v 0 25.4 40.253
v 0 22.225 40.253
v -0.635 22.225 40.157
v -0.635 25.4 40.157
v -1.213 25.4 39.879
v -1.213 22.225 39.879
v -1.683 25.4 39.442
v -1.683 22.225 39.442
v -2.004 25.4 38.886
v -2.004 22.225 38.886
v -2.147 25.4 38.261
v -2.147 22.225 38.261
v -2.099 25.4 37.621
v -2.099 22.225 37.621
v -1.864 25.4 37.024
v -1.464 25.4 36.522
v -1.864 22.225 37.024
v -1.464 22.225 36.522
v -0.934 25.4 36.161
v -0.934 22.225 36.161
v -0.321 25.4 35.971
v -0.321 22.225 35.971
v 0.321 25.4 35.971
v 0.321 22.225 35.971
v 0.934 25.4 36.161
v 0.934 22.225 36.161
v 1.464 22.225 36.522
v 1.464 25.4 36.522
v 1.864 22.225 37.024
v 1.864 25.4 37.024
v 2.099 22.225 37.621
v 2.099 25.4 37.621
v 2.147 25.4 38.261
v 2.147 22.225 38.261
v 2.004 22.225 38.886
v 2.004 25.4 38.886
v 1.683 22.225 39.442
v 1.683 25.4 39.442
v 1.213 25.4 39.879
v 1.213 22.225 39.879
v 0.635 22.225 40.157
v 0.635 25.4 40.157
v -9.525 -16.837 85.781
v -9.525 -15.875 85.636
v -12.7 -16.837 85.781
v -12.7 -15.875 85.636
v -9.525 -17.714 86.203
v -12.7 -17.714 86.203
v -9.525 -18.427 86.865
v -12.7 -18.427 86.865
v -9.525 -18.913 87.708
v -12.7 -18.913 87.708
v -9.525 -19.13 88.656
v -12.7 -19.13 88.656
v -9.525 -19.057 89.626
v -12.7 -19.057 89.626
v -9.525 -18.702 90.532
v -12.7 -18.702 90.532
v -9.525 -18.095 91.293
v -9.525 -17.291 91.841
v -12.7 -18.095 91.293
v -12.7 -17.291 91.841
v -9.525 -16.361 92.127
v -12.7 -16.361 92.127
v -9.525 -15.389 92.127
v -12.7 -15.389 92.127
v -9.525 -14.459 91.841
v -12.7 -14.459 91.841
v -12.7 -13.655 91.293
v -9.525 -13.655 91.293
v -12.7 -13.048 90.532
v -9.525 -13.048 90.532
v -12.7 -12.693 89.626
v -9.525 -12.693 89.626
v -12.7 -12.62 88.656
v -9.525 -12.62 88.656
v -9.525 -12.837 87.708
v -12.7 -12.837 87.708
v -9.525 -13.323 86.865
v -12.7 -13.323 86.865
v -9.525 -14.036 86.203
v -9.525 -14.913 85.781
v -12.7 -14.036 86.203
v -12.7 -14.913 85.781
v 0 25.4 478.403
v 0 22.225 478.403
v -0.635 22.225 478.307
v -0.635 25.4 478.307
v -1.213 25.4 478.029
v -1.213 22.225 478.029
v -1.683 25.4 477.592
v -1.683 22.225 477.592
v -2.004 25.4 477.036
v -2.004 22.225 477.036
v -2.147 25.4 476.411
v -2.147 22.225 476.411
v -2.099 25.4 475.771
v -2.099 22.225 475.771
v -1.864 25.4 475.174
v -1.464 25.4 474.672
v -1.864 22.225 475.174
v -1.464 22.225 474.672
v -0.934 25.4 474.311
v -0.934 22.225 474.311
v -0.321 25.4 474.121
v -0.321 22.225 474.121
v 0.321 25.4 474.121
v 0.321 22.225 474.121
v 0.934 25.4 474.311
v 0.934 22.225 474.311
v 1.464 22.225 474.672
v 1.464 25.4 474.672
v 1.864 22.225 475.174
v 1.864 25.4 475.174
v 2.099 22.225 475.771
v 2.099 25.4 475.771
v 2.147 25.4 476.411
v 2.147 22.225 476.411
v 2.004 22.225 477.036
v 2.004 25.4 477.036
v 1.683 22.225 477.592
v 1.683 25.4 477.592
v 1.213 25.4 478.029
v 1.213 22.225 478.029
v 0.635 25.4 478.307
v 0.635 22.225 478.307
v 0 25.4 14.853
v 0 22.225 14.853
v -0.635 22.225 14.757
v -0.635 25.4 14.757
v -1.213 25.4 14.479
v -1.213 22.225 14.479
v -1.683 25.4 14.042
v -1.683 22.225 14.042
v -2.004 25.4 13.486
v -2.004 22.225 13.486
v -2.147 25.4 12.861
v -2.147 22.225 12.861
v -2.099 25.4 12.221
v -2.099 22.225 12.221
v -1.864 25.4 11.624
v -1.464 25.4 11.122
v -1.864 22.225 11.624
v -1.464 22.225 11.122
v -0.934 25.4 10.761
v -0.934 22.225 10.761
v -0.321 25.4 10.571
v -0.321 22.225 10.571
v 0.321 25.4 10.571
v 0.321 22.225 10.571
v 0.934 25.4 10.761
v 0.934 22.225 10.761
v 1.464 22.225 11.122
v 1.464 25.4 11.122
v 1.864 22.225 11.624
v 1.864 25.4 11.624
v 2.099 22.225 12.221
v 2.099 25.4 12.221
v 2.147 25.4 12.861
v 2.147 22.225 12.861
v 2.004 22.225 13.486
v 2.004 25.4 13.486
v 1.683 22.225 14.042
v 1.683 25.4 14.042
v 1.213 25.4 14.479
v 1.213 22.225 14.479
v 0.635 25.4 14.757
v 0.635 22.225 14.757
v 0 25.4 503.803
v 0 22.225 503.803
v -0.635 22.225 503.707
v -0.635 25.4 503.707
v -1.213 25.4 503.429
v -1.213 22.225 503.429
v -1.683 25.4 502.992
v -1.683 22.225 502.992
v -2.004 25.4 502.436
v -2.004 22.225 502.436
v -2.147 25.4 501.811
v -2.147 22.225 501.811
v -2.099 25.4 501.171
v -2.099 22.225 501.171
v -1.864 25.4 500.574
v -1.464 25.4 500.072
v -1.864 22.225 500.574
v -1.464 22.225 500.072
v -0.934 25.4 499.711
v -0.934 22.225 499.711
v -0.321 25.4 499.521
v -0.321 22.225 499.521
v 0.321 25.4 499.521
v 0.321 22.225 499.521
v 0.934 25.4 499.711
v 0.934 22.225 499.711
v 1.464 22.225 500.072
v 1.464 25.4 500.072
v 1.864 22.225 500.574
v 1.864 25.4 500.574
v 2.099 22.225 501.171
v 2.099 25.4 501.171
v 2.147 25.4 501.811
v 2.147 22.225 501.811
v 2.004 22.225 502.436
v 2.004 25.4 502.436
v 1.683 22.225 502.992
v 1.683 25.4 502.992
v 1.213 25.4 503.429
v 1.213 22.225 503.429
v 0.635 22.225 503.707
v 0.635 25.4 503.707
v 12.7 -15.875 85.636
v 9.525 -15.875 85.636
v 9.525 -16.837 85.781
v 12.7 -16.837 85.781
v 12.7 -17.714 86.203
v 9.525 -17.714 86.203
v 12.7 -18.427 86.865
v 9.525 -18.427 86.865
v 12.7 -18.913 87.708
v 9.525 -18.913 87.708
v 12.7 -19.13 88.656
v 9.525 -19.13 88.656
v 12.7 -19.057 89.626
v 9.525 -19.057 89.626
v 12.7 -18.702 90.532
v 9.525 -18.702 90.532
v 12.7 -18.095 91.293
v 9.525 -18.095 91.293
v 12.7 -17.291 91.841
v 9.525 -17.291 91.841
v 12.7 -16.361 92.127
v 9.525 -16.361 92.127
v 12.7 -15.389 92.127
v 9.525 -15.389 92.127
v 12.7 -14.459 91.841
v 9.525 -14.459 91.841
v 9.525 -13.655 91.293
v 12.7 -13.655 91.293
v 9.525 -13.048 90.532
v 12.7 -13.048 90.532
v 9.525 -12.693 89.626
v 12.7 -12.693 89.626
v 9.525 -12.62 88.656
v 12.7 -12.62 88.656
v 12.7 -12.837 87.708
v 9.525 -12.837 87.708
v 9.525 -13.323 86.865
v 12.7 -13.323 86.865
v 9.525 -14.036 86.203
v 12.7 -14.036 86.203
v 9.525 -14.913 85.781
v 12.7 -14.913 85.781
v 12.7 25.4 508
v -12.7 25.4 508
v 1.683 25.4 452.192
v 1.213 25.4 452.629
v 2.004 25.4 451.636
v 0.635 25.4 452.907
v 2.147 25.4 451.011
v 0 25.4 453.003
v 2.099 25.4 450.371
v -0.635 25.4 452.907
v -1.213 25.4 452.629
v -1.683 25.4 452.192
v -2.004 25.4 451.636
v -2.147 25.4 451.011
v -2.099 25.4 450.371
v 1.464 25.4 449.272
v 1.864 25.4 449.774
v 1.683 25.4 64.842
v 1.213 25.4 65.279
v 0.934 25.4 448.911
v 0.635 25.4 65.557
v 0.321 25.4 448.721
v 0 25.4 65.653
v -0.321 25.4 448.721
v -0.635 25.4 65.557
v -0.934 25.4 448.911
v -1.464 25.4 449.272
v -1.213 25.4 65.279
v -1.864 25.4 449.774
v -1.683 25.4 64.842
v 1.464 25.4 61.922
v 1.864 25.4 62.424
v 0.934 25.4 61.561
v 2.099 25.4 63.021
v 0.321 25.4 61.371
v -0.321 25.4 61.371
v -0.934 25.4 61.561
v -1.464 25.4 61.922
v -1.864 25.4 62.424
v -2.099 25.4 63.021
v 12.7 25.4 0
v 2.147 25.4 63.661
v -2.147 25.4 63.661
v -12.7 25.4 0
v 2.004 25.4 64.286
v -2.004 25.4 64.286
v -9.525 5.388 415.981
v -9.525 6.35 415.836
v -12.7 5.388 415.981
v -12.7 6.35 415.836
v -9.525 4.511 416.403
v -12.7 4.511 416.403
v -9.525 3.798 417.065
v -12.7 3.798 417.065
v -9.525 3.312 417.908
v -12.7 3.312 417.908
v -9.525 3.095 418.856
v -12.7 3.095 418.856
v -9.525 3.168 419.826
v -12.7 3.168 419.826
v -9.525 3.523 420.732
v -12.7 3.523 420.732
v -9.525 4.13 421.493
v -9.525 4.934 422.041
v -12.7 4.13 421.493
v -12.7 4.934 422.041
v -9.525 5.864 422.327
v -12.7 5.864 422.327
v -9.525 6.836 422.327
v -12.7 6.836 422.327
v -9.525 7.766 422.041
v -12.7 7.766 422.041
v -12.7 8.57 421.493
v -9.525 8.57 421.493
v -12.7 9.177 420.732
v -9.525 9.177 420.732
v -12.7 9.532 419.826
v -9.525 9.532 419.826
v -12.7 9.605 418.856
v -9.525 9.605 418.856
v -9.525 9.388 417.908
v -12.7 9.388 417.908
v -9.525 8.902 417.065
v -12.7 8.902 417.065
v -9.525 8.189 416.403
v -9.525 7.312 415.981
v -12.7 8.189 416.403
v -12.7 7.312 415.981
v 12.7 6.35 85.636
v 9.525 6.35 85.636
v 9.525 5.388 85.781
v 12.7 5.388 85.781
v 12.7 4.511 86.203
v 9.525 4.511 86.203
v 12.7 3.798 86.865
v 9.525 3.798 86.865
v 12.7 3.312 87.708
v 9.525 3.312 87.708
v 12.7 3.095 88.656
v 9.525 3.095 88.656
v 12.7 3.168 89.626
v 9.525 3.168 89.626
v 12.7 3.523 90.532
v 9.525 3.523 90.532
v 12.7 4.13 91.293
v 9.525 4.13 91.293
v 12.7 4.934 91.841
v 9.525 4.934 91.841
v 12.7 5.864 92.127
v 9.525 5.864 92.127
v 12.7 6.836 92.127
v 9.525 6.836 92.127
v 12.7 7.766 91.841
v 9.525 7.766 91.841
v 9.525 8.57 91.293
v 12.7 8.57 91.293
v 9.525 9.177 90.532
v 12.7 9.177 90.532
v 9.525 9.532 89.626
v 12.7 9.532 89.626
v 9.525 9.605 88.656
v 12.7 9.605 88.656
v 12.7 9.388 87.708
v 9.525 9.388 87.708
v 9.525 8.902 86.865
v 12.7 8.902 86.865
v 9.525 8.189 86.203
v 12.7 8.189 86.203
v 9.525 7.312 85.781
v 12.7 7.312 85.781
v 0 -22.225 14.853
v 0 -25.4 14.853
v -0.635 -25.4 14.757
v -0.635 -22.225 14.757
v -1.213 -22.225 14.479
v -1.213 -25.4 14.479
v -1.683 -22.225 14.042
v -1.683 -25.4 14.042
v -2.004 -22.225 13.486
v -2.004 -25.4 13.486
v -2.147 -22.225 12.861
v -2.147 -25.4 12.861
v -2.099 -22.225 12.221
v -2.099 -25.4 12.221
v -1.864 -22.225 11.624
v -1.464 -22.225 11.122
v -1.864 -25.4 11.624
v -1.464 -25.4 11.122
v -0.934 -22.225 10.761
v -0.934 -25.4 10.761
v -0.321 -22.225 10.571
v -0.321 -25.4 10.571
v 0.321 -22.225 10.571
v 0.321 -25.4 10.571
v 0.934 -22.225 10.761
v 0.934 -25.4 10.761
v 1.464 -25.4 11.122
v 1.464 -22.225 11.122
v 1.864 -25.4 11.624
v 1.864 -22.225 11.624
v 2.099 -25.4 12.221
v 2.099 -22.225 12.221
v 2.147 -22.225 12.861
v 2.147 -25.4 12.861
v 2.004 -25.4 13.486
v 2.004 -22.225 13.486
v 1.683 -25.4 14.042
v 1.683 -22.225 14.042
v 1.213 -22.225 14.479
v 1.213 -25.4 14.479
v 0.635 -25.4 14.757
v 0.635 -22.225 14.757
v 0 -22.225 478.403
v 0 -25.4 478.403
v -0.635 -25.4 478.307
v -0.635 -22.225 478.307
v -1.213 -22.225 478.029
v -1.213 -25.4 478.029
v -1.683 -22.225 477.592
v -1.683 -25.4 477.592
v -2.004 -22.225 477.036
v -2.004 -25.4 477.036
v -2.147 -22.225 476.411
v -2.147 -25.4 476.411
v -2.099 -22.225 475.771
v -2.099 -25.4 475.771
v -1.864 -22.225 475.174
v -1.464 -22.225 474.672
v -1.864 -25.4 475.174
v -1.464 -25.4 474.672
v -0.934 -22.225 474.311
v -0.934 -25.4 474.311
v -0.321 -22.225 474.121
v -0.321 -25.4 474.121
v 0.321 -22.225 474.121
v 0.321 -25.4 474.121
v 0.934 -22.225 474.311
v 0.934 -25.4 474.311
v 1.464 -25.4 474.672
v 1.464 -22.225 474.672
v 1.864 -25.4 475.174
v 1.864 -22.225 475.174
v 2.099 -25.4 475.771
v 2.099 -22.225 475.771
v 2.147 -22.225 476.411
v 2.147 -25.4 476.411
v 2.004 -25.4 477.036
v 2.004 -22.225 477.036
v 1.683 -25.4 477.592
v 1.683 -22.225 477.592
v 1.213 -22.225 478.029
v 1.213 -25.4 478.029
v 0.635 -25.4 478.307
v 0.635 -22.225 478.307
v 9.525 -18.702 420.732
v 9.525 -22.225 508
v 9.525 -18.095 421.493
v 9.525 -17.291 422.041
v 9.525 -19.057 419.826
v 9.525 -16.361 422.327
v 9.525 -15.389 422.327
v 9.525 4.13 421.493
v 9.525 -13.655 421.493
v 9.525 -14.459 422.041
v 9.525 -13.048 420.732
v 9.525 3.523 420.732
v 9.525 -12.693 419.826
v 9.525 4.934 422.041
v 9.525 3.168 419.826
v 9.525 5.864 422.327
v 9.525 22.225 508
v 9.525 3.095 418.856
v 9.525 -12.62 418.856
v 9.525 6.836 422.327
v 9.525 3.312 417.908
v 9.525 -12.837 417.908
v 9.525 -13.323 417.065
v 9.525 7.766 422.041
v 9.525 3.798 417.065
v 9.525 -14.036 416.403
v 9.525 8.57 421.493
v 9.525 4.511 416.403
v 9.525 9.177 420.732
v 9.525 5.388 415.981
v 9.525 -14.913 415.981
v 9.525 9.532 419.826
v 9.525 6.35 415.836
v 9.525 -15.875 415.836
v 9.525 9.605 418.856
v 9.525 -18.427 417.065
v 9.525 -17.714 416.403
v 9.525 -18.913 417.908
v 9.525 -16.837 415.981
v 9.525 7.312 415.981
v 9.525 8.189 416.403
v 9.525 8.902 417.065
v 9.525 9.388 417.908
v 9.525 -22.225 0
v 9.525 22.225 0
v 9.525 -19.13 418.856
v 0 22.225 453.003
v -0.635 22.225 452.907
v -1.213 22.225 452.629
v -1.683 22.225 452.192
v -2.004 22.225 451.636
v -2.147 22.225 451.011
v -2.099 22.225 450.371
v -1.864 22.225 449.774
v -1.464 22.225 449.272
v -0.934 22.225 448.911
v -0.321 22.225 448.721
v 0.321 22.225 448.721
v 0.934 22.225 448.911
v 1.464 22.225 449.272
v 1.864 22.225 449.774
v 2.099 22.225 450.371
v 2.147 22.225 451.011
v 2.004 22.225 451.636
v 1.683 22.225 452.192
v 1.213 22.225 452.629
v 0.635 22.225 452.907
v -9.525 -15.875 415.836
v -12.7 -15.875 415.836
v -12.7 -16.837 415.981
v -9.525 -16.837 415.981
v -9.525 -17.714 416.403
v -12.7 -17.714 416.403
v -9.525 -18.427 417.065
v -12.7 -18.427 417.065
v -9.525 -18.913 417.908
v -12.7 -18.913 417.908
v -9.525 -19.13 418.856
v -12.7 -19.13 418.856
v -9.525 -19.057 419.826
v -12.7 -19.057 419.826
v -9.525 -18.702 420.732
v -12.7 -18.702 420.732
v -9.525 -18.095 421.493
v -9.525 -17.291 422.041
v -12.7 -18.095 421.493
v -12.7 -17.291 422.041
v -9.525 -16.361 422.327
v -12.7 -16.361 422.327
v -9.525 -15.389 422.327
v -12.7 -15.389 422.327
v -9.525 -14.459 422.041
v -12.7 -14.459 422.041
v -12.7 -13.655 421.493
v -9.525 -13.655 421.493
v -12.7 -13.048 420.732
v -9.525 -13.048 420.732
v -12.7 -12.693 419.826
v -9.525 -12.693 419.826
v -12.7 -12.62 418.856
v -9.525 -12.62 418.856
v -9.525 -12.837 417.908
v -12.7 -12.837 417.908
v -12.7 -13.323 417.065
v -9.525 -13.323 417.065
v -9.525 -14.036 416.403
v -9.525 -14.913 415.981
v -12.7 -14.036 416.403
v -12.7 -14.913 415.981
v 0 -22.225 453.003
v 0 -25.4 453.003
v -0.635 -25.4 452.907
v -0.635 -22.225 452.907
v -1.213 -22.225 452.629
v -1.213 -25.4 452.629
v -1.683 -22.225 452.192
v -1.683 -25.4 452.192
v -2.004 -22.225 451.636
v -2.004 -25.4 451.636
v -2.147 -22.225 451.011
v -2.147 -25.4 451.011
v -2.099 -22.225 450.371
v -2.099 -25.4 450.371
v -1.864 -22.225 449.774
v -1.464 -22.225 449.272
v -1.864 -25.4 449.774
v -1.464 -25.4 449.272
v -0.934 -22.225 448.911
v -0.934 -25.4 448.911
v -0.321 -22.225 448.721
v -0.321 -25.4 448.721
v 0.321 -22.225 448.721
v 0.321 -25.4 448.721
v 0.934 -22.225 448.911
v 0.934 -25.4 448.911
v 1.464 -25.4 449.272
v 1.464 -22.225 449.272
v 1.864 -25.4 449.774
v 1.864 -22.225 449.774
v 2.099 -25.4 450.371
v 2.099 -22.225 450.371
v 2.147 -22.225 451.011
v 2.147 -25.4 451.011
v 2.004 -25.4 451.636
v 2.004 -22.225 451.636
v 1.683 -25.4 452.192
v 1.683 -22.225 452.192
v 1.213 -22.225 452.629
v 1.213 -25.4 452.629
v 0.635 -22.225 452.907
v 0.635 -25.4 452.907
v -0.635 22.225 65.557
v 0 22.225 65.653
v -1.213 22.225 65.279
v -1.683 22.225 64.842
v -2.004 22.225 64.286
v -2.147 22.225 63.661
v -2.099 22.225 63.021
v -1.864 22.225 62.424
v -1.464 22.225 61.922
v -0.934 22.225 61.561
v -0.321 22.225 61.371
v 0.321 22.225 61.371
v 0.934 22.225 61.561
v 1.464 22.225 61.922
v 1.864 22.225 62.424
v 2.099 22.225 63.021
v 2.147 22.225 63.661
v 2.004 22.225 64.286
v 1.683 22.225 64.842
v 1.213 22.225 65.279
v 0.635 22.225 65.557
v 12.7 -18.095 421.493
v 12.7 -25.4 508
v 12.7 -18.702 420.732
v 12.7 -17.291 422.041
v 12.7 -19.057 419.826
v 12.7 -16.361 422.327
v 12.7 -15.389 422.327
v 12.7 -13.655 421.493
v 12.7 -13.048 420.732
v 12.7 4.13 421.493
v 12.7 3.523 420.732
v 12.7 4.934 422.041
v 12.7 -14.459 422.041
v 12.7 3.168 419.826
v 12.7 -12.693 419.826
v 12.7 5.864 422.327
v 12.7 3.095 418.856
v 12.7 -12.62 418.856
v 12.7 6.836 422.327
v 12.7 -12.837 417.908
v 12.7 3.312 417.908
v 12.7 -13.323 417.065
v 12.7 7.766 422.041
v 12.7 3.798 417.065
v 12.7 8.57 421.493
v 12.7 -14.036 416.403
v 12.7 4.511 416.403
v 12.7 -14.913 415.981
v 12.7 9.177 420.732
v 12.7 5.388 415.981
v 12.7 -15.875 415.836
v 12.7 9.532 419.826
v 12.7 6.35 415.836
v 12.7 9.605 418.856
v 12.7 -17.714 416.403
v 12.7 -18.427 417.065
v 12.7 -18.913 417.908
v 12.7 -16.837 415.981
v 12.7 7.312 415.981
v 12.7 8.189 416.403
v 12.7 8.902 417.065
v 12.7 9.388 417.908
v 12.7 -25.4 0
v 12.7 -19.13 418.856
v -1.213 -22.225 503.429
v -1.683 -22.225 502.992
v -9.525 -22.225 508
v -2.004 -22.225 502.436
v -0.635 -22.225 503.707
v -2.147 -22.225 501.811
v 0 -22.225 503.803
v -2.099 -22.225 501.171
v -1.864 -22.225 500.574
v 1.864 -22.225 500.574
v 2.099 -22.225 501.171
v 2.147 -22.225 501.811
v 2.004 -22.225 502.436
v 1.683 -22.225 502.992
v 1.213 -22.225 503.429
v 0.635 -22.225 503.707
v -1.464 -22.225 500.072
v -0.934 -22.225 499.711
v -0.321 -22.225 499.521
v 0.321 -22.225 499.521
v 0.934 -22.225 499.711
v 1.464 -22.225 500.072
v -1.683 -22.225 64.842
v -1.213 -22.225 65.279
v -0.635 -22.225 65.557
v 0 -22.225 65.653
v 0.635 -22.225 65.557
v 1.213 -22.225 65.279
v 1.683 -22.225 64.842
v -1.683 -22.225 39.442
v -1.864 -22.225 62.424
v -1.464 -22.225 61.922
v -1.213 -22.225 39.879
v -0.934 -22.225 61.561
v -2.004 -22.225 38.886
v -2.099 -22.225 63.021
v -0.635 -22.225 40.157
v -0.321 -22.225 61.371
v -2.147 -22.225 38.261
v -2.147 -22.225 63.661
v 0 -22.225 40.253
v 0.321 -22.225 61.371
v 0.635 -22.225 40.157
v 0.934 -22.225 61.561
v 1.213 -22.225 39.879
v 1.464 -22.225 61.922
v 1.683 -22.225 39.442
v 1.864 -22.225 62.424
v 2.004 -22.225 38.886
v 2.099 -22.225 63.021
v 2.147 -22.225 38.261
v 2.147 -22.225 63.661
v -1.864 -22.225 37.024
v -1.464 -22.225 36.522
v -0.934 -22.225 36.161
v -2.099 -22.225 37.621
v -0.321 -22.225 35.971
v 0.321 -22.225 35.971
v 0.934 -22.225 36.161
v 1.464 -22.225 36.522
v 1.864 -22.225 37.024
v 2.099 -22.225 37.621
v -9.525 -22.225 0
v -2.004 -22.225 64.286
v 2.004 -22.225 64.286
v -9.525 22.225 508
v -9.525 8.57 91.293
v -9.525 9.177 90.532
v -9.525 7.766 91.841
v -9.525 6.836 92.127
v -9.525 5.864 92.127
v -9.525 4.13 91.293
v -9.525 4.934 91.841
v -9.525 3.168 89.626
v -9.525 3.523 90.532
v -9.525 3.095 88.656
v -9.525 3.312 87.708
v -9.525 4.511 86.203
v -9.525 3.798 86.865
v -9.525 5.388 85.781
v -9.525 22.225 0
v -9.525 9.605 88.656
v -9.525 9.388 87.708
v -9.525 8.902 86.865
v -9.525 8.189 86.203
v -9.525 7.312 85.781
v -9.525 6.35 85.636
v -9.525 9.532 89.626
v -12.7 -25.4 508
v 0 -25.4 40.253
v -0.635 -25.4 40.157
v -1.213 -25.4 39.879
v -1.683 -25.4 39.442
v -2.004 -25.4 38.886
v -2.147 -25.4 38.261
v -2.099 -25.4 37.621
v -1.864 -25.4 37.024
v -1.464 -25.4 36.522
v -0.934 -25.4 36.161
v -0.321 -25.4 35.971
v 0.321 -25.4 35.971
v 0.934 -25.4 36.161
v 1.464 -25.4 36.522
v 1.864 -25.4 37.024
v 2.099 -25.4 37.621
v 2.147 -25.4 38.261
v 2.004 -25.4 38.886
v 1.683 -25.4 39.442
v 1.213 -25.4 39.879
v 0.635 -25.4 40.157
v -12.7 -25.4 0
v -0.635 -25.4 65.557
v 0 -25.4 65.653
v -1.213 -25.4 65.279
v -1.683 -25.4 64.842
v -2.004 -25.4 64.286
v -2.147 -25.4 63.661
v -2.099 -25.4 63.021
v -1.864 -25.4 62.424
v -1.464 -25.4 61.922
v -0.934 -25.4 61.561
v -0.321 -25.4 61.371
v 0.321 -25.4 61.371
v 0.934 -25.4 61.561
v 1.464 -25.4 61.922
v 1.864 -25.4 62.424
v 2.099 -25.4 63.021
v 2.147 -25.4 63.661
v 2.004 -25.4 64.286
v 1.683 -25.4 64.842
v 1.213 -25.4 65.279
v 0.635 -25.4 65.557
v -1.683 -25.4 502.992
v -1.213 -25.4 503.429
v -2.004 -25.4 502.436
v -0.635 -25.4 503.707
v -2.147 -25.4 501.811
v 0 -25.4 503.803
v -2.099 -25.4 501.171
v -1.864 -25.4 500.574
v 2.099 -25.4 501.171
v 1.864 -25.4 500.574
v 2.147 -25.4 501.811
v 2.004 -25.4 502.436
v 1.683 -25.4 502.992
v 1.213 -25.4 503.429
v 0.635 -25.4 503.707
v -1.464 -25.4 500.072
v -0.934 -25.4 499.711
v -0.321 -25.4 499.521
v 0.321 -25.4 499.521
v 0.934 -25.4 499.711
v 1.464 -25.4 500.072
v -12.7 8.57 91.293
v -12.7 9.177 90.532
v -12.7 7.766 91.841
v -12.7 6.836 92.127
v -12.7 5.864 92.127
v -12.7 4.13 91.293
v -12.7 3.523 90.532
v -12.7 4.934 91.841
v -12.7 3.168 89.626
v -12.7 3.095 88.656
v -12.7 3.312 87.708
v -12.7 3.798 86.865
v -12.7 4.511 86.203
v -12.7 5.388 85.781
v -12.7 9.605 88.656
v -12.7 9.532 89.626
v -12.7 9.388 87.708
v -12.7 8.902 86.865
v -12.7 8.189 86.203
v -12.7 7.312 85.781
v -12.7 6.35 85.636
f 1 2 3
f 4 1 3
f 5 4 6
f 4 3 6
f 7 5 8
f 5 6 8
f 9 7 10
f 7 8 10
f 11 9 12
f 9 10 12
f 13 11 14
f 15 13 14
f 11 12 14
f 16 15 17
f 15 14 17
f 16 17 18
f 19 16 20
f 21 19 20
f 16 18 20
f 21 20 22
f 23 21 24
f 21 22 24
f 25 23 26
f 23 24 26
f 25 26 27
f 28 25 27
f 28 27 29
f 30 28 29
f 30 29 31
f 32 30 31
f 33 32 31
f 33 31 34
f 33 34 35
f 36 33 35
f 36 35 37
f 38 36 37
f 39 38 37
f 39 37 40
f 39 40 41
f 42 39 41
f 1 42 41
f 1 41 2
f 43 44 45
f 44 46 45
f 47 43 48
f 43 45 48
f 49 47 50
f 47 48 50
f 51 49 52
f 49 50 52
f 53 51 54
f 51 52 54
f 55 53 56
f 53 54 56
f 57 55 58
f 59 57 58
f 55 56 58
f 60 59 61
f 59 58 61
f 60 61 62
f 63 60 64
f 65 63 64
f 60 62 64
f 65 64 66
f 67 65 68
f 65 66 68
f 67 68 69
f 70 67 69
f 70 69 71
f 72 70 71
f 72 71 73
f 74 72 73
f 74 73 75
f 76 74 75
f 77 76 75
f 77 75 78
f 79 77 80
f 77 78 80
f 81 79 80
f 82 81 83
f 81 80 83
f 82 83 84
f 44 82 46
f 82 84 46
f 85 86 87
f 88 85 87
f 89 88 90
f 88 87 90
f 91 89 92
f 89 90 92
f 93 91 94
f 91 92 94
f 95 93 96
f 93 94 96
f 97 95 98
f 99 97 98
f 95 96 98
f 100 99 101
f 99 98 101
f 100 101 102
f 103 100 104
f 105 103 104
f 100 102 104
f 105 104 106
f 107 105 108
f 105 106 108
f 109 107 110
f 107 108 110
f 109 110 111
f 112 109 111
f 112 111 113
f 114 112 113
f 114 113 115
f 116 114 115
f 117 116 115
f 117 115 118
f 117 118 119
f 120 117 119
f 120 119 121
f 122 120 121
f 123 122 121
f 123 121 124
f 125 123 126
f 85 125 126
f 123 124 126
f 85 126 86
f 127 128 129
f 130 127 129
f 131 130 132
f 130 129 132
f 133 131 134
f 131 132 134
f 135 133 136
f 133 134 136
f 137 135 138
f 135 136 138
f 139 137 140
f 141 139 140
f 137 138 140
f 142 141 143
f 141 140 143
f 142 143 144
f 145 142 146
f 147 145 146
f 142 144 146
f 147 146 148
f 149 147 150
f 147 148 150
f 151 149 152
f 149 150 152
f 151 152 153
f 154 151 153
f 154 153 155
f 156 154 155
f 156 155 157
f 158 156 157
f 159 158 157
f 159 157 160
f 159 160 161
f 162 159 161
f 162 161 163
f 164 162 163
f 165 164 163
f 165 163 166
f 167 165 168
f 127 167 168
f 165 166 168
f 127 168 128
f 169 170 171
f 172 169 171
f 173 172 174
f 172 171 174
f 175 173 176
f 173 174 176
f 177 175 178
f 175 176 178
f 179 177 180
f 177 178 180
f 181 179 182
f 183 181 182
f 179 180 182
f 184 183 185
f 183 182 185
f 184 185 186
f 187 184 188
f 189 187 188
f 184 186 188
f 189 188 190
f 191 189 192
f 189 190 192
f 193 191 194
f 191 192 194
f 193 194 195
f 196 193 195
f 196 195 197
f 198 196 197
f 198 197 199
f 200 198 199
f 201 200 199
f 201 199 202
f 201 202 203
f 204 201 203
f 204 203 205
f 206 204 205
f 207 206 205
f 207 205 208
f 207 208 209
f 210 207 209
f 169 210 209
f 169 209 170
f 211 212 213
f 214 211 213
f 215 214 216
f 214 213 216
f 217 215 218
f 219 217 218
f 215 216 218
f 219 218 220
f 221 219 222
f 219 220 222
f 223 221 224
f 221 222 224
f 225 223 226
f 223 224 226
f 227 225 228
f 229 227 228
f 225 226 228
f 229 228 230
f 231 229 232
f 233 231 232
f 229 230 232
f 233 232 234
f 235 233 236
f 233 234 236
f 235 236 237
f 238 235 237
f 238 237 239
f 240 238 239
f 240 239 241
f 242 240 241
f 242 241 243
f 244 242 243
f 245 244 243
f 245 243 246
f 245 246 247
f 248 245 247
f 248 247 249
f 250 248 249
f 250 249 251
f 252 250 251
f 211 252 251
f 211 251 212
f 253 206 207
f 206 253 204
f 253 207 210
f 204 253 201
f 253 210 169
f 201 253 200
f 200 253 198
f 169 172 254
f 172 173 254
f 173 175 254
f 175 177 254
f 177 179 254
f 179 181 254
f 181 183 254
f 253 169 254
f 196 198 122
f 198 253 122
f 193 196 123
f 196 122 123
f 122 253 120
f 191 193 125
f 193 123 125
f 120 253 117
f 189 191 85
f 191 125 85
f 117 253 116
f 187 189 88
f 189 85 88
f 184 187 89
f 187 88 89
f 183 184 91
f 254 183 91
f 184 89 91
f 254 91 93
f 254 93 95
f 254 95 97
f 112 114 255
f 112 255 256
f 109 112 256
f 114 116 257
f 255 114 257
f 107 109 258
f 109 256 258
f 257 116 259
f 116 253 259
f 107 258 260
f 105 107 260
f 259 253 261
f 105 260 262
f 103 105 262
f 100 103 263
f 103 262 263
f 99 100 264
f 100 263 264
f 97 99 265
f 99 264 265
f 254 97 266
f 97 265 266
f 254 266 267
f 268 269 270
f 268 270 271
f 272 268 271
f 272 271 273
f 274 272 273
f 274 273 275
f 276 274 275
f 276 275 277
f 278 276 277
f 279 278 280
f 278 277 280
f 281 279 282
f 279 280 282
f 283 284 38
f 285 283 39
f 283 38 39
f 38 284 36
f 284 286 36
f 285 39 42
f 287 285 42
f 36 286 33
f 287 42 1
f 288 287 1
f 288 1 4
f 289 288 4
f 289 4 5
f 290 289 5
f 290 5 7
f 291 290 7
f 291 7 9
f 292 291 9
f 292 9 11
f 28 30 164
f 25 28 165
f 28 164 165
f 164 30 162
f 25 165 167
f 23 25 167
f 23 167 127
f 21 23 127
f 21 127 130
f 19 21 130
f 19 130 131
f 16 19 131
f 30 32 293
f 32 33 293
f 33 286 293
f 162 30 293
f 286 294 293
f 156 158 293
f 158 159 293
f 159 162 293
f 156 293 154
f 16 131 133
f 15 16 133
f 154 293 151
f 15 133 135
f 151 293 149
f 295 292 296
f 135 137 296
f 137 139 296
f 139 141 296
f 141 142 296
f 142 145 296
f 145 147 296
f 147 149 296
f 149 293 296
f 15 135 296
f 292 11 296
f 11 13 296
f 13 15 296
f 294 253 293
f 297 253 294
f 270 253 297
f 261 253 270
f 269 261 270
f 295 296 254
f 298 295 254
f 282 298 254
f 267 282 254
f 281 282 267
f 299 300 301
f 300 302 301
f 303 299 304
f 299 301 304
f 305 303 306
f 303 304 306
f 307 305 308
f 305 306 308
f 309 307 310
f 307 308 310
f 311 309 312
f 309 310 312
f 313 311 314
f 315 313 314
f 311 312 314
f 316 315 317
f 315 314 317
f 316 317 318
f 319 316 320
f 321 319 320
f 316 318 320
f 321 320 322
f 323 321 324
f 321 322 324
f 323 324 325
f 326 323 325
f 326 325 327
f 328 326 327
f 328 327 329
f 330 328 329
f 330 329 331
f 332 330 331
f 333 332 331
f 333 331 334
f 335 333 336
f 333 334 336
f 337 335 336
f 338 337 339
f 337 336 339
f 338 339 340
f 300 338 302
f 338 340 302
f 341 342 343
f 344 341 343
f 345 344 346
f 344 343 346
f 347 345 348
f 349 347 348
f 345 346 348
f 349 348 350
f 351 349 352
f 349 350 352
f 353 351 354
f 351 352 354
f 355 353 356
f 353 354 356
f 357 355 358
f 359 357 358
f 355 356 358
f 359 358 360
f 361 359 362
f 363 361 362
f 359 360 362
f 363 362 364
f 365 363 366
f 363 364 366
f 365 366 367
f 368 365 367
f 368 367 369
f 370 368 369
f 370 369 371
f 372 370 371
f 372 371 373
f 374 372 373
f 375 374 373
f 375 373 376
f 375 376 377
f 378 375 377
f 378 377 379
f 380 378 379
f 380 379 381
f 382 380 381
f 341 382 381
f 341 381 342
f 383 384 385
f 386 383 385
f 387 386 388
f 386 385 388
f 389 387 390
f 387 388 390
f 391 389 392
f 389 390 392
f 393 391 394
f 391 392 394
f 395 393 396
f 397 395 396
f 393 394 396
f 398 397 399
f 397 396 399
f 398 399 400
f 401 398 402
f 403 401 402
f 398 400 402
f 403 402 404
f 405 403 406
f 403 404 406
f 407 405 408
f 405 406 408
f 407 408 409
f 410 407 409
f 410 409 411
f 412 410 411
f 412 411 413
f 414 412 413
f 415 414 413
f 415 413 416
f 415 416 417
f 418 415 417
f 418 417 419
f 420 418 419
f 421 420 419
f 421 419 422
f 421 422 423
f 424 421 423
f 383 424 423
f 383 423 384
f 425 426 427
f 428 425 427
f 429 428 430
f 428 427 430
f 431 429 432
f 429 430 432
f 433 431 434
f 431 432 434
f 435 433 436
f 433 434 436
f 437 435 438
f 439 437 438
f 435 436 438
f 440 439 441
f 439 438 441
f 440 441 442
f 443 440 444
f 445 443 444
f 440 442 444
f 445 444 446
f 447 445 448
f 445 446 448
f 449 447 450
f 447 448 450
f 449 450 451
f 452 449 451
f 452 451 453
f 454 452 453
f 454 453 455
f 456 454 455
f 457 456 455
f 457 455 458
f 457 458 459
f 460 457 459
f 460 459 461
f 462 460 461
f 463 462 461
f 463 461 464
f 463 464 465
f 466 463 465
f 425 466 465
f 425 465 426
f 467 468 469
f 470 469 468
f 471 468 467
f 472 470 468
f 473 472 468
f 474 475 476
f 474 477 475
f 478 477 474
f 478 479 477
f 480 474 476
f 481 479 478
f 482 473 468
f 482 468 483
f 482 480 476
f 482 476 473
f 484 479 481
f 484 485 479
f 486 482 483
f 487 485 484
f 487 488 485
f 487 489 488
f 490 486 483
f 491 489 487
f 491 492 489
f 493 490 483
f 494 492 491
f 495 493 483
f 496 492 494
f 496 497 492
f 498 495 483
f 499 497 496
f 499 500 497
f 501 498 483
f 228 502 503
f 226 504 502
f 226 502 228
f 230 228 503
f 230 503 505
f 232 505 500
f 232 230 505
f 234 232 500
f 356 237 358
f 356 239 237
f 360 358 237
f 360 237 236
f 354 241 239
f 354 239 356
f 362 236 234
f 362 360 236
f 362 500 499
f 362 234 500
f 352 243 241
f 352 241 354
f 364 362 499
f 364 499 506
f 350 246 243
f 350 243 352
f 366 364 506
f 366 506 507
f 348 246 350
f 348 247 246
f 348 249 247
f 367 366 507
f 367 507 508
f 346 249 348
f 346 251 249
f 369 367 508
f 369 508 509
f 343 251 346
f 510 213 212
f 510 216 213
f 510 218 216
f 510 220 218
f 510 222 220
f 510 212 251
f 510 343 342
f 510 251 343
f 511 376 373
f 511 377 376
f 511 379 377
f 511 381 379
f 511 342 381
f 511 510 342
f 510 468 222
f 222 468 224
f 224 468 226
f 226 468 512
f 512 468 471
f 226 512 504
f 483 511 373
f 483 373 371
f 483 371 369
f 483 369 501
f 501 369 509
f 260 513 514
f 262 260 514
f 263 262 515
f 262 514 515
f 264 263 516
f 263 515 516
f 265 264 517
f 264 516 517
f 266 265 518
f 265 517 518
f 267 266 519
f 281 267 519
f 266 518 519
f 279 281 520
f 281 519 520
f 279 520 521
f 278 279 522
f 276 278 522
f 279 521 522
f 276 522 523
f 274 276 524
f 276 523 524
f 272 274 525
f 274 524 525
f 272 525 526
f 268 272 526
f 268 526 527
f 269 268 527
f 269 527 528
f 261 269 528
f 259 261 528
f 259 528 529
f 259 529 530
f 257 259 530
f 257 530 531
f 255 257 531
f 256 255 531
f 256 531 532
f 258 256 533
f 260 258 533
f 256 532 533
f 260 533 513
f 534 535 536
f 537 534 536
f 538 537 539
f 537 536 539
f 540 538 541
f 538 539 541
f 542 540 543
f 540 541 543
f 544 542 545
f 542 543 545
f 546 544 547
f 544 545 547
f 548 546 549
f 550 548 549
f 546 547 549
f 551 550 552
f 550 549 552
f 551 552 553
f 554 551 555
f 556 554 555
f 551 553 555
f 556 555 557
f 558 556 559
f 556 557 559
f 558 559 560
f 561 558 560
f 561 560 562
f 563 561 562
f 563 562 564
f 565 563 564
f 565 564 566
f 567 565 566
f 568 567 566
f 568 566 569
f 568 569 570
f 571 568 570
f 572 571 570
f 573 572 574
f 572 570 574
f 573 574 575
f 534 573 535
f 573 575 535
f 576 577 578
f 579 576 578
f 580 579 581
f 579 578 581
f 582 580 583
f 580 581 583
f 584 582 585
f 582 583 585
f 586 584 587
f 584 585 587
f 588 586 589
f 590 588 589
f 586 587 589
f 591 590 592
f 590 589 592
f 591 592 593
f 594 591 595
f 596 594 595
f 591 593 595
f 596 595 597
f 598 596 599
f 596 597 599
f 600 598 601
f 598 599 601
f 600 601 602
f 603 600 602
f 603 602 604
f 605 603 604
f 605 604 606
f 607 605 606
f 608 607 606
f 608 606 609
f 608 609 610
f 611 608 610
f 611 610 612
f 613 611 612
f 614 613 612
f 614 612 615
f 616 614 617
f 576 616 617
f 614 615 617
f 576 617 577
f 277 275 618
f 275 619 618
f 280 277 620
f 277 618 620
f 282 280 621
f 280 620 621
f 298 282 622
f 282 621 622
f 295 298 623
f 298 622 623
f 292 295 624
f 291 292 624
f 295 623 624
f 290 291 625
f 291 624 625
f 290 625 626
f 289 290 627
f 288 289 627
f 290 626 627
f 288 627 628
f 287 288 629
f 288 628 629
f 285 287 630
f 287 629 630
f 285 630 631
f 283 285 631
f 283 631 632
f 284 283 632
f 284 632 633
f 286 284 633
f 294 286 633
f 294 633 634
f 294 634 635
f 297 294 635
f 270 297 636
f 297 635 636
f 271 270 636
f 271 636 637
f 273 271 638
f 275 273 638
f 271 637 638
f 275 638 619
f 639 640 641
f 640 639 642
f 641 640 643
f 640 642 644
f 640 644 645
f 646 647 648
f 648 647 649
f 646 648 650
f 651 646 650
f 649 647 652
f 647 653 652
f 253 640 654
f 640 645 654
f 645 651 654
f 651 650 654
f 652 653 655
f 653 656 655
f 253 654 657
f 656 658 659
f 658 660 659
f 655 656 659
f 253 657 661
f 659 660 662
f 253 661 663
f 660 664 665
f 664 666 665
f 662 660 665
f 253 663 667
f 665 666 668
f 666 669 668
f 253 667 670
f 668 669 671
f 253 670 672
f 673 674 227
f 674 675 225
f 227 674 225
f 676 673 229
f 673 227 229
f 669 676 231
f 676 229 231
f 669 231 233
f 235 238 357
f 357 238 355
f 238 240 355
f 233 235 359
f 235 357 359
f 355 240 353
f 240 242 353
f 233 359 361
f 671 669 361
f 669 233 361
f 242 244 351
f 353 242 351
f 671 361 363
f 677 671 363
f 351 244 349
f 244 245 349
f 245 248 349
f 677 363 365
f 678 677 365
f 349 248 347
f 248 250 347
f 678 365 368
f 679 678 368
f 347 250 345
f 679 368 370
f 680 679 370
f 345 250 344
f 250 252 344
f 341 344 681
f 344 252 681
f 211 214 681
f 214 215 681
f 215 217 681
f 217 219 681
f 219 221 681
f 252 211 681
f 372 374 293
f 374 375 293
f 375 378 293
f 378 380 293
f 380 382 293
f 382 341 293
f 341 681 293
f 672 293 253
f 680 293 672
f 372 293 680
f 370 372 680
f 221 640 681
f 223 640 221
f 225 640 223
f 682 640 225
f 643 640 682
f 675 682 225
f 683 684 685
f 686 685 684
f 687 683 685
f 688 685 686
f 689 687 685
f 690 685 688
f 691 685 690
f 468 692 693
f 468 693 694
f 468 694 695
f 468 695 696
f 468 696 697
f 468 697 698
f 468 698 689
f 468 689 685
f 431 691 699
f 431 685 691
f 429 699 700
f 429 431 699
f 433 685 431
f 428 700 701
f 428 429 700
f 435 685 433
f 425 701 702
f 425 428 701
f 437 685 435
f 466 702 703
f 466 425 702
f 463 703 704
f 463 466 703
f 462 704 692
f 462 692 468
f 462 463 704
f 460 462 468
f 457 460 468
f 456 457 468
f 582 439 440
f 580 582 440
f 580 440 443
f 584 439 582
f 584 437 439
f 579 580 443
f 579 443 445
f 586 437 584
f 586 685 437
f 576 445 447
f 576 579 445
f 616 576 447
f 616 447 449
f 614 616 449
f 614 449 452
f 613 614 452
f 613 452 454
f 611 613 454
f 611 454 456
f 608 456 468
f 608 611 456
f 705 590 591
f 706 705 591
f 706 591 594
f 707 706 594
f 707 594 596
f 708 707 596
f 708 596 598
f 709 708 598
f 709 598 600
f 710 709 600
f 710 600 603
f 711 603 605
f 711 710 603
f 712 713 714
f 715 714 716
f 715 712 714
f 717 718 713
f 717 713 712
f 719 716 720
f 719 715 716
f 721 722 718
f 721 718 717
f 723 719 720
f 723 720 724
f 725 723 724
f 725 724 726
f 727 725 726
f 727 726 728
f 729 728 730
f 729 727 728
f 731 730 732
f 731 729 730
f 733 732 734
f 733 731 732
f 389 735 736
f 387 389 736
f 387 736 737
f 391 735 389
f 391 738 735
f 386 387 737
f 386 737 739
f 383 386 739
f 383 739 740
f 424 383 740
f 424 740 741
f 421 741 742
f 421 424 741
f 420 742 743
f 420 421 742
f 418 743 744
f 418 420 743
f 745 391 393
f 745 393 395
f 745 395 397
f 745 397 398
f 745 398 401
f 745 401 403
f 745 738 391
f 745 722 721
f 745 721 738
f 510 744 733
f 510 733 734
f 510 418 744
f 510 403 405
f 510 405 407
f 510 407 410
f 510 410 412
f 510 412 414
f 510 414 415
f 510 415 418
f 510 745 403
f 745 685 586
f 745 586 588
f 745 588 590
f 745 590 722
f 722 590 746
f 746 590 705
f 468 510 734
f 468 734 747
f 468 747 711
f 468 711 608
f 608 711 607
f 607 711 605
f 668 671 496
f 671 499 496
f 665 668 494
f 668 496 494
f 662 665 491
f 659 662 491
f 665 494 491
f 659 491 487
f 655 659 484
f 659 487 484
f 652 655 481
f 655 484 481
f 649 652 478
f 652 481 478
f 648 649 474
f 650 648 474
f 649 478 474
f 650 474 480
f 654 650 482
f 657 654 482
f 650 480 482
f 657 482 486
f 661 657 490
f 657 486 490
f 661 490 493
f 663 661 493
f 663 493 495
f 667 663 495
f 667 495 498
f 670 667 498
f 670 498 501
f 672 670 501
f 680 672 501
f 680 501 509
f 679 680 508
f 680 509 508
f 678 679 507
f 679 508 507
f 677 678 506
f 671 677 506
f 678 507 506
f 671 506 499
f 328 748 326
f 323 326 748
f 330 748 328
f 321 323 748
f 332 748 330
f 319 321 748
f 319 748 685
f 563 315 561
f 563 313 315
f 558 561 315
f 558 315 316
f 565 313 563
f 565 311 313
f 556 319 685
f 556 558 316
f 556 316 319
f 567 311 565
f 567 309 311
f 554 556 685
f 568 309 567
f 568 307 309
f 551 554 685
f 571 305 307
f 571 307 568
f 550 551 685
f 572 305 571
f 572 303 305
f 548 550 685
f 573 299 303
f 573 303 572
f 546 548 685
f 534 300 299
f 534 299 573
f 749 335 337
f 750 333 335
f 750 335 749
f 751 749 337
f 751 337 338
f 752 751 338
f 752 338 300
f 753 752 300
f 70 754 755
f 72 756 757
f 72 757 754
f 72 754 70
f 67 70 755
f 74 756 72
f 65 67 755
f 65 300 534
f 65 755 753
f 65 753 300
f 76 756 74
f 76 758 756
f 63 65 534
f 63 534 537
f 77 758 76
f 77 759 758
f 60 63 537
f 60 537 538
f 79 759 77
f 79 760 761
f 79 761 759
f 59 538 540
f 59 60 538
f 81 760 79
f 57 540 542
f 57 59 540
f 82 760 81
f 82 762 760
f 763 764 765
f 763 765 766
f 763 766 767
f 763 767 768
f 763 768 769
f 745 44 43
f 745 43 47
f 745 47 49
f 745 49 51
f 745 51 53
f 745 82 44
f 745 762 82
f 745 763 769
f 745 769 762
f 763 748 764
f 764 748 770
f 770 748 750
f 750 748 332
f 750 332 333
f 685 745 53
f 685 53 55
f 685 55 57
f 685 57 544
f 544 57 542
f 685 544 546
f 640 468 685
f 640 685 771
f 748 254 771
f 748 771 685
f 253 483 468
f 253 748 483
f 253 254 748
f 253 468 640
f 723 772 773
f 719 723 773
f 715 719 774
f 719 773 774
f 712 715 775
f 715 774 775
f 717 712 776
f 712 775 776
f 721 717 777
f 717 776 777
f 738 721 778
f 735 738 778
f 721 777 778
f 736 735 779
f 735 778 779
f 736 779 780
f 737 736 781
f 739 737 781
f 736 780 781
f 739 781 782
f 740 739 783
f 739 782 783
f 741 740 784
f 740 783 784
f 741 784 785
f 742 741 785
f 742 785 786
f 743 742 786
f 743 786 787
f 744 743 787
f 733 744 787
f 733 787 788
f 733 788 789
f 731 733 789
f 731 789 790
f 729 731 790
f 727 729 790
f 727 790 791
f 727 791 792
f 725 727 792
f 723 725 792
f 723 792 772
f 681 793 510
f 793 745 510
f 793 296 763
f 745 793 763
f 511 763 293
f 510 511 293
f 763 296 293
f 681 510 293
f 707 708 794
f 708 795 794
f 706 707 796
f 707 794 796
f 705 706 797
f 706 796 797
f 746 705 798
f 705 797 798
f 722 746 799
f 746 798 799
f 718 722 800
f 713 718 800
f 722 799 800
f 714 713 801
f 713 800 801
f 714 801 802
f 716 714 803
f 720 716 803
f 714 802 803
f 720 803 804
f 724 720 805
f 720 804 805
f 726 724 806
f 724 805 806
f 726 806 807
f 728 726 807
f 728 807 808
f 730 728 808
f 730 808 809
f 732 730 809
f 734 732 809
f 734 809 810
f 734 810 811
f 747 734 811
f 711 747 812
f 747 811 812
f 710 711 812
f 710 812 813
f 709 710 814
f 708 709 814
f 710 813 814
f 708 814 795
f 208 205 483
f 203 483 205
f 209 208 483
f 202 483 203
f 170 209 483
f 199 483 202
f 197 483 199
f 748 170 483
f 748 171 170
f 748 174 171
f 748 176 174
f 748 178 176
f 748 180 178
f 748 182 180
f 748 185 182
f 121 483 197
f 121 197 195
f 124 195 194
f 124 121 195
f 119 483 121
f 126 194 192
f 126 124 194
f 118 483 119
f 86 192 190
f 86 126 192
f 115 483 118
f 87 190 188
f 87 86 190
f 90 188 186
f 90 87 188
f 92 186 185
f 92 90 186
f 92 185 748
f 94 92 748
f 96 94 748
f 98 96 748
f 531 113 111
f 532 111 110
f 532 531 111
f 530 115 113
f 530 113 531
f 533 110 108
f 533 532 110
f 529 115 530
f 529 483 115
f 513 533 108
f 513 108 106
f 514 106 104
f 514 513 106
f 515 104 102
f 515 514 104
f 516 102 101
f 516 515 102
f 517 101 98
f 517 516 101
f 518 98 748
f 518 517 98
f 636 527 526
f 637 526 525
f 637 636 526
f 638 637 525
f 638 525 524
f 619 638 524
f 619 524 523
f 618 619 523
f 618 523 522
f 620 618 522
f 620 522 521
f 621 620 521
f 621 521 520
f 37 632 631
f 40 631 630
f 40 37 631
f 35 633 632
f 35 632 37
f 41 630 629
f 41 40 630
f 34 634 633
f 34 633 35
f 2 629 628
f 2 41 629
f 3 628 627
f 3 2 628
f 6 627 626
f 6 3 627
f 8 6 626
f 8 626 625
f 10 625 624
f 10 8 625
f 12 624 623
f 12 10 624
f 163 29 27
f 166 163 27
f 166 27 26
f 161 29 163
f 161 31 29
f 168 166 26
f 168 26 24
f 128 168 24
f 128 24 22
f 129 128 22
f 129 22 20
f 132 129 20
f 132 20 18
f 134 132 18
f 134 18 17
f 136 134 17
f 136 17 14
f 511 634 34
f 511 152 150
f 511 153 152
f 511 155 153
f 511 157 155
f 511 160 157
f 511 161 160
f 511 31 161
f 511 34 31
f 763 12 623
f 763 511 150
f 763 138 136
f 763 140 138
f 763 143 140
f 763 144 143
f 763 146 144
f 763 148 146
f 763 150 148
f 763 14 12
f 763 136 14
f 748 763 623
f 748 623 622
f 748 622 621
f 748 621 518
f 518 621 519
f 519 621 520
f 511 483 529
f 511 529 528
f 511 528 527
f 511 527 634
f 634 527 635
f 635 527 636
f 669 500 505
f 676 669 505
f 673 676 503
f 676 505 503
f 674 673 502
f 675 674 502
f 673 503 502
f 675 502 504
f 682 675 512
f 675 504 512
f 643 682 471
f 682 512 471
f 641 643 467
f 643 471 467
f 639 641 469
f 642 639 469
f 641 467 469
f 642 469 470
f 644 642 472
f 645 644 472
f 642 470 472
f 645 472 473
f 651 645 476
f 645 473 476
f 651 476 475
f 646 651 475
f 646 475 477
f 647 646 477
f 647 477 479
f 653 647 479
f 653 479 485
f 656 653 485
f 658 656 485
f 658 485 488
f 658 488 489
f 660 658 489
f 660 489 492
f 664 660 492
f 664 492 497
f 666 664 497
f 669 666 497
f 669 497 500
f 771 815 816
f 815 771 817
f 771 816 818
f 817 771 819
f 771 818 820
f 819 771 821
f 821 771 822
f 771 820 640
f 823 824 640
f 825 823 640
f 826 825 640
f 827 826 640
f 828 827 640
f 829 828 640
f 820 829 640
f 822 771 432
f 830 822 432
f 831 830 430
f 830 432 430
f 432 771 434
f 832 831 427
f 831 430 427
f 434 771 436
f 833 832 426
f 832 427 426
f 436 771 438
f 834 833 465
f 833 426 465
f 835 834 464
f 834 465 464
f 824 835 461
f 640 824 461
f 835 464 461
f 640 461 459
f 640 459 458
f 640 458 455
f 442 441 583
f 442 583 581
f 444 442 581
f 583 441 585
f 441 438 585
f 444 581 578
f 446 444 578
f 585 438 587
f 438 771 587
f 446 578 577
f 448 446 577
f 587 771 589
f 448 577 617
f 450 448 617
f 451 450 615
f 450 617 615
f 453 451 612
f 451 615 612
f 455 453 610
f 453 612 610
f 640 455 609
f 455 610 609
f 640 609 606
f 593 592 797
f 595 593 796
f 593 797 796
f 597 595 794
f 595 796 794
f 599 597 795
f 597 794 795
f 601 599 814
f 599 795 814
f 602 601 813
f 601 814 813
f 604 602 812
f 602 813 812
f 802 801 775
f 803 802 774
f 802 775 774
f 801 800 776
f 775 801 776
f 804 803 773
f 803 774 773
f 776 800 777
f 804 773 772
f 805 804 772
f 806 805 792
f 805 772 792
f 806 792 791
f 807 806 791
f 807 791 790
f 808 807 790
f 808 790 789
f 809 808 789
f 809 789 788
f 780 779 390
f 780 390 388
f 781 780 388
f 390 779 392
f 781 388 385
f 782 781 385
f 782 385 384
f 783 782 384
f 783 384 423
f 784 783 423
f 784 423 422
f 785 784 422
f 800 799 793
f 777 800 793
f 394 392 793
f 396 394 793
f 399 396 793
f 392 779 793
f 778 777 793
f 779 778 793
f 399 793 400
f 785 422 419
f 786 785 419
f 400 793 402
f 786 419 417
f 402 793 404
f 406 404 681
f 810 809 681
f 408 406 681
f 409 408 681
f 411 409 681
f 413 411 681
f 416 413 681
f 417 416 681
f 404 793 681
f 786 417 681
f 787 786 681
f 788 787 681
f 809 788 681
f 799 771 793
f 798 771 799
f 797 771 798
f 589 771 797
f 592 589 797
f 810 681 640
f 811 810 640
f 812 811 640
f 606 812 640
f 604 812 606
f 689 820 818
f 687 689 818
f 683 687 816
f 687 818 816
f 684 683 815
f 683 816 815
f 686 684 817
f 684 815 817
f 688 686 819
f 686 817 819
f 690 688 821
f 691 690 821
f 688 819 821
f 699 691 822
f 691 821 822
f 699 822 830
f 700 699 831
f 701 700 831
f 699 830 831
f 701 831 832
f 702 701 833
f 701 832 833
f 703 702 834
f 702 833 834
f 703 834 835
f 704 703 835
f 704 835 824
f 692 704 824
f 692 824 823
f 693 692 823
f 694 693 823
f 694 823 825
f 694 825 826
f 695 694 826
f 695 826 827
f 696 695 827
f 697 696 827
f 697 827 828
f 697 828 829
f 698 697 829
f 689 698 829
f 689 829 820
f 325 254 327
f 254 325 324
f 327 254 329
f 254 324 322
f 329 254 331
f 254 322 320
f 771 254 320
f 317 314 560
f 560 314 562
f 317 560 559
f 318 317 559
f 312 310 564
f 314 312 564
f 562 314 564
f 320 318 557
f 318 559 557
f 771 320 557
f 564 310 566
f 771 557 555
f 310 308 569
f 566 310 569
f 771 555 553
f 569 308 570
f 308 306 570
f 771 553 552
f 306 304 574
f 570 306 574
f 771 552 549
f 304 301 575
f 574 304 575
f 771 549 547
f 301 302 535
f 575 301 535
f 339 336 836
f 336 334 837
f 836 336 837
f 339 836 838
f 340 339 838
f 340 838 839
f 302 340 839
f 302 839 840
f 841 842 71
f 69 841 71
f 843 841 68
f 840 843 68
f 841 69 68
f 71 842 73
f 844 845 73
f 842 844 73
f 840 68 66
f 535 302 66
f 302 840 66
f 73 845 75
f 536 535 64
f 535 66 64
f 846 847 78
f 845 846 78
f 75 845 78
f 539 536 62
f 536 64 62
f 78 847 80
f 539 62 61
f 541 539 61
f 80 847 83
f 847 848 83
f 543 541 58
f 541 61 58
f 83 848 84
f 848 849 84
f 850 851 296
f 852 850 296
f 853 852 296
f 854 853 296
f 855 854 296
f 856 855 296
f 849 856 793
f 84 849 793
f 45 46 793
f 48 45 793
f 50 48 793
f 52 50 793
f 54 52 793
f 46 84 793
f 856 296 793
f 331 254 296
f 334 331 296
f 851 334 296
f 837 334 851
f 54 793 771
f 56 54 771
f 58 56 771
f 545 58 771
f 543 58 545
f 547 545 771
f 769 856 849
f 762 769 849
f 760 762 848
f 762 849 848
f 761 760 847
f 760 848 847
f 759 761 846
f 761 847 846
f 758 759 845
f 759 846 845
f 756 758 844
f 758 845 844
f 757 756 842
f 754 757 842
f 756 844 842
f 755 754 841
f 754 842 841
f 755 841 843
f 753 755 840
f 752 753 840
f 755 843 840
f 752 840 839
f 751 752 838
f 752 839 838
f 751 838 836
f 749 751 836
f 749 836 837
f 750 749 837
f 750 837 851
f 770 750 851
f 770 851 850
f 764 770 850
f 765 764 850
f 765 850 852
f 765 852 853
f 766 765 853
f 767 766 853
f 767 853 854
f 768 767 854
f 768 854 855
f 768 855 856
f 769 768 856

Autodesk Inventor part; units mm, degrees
ref_plane "YZ Plane" through (0, 0, 0) normal (1, 0, 0) x (0, 1, 0)
ref_plane "Start Plane" through (0, 0, 0) normal (0, 0, 1) x (1, 0, 0)
ref_plane "End Plane" through (0, 0, 508) normal (0, 0, 1) x (1, 0, 0)
sketch "Sketch" plane through (0, 0, 0) normal (0, 0, 1) x (1, 0, 0)
  line L0 (-12.7, -25.4) -> (12.7, -25.4)
  line L1 (12.7, -25.4) -> (12.7, 25.4)
  line L2 (12.7, 25.4) -> (-12.7, 25.4)
  line L3 (-12.7, 25.4) -> (-12.7, -25.4)
  line L4 (-12.7, -25.4) -> (12.7, 25.4) construction
  line L5 (12.7, -25.4) -> (-12.7, 25.4) construction
  line L6 (-9.525, -22.225) -> (9.525, -22.225)
  line L7 (9.525, -22.225) -> (9.525, 22.225)
  line L8 (9.525, 22.225) -> (-9.525, 22.225)
  line L9 (-9.525, 22.225) -> (-9.525, -22.225)
  line L10 (-9.525, -22.225) -> (9.525, 22.225) construction
  line L11 (9.525, -22.225) -> (-9.525, 22.225) construction
  point P0 (0, 0)
  dimension "d0" = 25.4
  dimension "d1" = 50.8
  dimension "d2" = 3.175
  dimension "d3" = 3.175
extrude "Body" add sketch "Sketch" along normal up to surface (508 mm away) from surface at 0
sketch "Sketch6" plane through (0, 0, 0) normal (0, 0, 1) x (1, 0, 0)
  line L0 (0, 0) -> (10, 0)
ref_plane "Work Plane5" through (0, 0, 0) normal (0, -1, 0) x (1, 0, 0)
sketch "Sketch7" plane through (0, 0, 0) normal (0, -1, 0) x (1, 0, 0)
  line L0 (-2, 0) -> (12, 0)
  line L1 (-2, 508) -> (12, 508)
  dimension "d11" = 508
sketch "Sketch9" plane through (-12.7, 25.4, 508) normal (0, 1, 0) x (1, 0, 0)
  point P0 (12.7, 508)
sketch "Sketch10" plane through (-12.7, 25.4, 508) normal (0, 1, 0) x (1, 0, 0)
  point P0 (12.7, 508)
sketch "Sketch11" plane through (-12.7, 25.4, 508) normal (0, 1, 0) x (1, 0, 0)
  line L0 (0, 508) -> (25.4, 508) projected
  line L1 (25.4, 508) -> (25.4, 0) projected
  line L2 (0, 0) -> (25.4, 0) projected
  point P0 (12.7, 508)
  point P1 (12.7, 495.3)
  point P2 (12.7, 469.9)
  point P3 (12.7, 444.5)
  point P4 (12.7, 57.15)
  point P5 (12.7, 31.75)
  point P6 (12.7, 6.35)
  point P7 (12.7, 0)
  dimension "d23" = 12.7
  dimension "d24" = 25.4
  dimension "d25" = 25.4
  dimension "d26" = 12.7
  dimension "d27" = 12.7
  dimension "d28" = 6.35
  dimension "d29" = 25.4
  dimension "d30" = 25.4
hole "Hole2" at (0, 25.4, 12.7) at (0, 25.4, 38.1) at (0, 25.4, 63.5) at (0, 25.4, 450.85) at (0, 25.4, 476.25) at (0, 25.4, 501.65) direction (0, -1, 0) diameter 4.3053 depth 50.8 tip angle 118 clearance for "Pop Rivet" size "5/32" standard "4859 Fastners"
sketch "Sketch12" plane through (12.7, -25.4, 508) normal (1, 0, 0) x (0, 0, -1)
  point P0 (508, 25.4)
sketch "Sketch13" plane through (12.7, -25.4, 508) normal (1, 0, 0) x (0, 0, -1)
  line L0 (508, 50.8) -> (508, 0) projected
  line L1 (508, 0) -> (0, 0) projected
  point P0 (508, 25.4)
  point P1 (419.1, 31.75)
  point P2 (419.1, 9.525)
  dimension "d38" = 88.9
  dimension "d39" = 88.9
  dimension "d40" = 9.525
  dimension "d41" = 31.75
hole "Hole3" at (12.7, 6.35, 88.9) at (12.7, -15.875, 88.9) direction (-1, 0, 0) diameter 6.5278 depth 50.8 tip angle 118
sketch "Sketch14" plane through (12.7, -25.4, 508) normal (1, 0, 0) x (0, 0, -1)
  line L0 (508, 0) -> (0, 0) projected
  line L1 (0, 50.8) -> (0, 0) projected
  point P0 (508, 25.4)
  point P1 (88.9, 31.75)
  point P2 (88.9, 9.525)
  dimension "d49" = 9.525
  dimension "d50" = 31.75
  dimension "d51" = 88.9
  dimension "d52" = 88.9
hole "Hole4" at (12.7, 6.35, 419.1) at (12.7, -15.875, 419.1) direction (-1, 0, 0) diameter 6.5278 depth 50.8 tip angle 118
equation "\"d0\" = Width"
equation "\"d1\" = Height"
equation "\"d2\" = Thickness"
equation "\"d3\" = Thickness"
equation "\"Height\" = 50.8"
equation "\"Width\" = 25.4"
equation "\"Thickness\" = 3.175"
equation "\"BaseLength\" = 508"
equation "\"G_OFFSET_START\" = 0"
equation "\"G_OFFSET_END\" = 0"
equation "\"d7\" = BaseLength + G_OFFSET_END"
equation "\"G_L\" = d11"
properties part number "AL RECT TUBE 2 x 1 x 0.125" material "Aluminum 6061"
